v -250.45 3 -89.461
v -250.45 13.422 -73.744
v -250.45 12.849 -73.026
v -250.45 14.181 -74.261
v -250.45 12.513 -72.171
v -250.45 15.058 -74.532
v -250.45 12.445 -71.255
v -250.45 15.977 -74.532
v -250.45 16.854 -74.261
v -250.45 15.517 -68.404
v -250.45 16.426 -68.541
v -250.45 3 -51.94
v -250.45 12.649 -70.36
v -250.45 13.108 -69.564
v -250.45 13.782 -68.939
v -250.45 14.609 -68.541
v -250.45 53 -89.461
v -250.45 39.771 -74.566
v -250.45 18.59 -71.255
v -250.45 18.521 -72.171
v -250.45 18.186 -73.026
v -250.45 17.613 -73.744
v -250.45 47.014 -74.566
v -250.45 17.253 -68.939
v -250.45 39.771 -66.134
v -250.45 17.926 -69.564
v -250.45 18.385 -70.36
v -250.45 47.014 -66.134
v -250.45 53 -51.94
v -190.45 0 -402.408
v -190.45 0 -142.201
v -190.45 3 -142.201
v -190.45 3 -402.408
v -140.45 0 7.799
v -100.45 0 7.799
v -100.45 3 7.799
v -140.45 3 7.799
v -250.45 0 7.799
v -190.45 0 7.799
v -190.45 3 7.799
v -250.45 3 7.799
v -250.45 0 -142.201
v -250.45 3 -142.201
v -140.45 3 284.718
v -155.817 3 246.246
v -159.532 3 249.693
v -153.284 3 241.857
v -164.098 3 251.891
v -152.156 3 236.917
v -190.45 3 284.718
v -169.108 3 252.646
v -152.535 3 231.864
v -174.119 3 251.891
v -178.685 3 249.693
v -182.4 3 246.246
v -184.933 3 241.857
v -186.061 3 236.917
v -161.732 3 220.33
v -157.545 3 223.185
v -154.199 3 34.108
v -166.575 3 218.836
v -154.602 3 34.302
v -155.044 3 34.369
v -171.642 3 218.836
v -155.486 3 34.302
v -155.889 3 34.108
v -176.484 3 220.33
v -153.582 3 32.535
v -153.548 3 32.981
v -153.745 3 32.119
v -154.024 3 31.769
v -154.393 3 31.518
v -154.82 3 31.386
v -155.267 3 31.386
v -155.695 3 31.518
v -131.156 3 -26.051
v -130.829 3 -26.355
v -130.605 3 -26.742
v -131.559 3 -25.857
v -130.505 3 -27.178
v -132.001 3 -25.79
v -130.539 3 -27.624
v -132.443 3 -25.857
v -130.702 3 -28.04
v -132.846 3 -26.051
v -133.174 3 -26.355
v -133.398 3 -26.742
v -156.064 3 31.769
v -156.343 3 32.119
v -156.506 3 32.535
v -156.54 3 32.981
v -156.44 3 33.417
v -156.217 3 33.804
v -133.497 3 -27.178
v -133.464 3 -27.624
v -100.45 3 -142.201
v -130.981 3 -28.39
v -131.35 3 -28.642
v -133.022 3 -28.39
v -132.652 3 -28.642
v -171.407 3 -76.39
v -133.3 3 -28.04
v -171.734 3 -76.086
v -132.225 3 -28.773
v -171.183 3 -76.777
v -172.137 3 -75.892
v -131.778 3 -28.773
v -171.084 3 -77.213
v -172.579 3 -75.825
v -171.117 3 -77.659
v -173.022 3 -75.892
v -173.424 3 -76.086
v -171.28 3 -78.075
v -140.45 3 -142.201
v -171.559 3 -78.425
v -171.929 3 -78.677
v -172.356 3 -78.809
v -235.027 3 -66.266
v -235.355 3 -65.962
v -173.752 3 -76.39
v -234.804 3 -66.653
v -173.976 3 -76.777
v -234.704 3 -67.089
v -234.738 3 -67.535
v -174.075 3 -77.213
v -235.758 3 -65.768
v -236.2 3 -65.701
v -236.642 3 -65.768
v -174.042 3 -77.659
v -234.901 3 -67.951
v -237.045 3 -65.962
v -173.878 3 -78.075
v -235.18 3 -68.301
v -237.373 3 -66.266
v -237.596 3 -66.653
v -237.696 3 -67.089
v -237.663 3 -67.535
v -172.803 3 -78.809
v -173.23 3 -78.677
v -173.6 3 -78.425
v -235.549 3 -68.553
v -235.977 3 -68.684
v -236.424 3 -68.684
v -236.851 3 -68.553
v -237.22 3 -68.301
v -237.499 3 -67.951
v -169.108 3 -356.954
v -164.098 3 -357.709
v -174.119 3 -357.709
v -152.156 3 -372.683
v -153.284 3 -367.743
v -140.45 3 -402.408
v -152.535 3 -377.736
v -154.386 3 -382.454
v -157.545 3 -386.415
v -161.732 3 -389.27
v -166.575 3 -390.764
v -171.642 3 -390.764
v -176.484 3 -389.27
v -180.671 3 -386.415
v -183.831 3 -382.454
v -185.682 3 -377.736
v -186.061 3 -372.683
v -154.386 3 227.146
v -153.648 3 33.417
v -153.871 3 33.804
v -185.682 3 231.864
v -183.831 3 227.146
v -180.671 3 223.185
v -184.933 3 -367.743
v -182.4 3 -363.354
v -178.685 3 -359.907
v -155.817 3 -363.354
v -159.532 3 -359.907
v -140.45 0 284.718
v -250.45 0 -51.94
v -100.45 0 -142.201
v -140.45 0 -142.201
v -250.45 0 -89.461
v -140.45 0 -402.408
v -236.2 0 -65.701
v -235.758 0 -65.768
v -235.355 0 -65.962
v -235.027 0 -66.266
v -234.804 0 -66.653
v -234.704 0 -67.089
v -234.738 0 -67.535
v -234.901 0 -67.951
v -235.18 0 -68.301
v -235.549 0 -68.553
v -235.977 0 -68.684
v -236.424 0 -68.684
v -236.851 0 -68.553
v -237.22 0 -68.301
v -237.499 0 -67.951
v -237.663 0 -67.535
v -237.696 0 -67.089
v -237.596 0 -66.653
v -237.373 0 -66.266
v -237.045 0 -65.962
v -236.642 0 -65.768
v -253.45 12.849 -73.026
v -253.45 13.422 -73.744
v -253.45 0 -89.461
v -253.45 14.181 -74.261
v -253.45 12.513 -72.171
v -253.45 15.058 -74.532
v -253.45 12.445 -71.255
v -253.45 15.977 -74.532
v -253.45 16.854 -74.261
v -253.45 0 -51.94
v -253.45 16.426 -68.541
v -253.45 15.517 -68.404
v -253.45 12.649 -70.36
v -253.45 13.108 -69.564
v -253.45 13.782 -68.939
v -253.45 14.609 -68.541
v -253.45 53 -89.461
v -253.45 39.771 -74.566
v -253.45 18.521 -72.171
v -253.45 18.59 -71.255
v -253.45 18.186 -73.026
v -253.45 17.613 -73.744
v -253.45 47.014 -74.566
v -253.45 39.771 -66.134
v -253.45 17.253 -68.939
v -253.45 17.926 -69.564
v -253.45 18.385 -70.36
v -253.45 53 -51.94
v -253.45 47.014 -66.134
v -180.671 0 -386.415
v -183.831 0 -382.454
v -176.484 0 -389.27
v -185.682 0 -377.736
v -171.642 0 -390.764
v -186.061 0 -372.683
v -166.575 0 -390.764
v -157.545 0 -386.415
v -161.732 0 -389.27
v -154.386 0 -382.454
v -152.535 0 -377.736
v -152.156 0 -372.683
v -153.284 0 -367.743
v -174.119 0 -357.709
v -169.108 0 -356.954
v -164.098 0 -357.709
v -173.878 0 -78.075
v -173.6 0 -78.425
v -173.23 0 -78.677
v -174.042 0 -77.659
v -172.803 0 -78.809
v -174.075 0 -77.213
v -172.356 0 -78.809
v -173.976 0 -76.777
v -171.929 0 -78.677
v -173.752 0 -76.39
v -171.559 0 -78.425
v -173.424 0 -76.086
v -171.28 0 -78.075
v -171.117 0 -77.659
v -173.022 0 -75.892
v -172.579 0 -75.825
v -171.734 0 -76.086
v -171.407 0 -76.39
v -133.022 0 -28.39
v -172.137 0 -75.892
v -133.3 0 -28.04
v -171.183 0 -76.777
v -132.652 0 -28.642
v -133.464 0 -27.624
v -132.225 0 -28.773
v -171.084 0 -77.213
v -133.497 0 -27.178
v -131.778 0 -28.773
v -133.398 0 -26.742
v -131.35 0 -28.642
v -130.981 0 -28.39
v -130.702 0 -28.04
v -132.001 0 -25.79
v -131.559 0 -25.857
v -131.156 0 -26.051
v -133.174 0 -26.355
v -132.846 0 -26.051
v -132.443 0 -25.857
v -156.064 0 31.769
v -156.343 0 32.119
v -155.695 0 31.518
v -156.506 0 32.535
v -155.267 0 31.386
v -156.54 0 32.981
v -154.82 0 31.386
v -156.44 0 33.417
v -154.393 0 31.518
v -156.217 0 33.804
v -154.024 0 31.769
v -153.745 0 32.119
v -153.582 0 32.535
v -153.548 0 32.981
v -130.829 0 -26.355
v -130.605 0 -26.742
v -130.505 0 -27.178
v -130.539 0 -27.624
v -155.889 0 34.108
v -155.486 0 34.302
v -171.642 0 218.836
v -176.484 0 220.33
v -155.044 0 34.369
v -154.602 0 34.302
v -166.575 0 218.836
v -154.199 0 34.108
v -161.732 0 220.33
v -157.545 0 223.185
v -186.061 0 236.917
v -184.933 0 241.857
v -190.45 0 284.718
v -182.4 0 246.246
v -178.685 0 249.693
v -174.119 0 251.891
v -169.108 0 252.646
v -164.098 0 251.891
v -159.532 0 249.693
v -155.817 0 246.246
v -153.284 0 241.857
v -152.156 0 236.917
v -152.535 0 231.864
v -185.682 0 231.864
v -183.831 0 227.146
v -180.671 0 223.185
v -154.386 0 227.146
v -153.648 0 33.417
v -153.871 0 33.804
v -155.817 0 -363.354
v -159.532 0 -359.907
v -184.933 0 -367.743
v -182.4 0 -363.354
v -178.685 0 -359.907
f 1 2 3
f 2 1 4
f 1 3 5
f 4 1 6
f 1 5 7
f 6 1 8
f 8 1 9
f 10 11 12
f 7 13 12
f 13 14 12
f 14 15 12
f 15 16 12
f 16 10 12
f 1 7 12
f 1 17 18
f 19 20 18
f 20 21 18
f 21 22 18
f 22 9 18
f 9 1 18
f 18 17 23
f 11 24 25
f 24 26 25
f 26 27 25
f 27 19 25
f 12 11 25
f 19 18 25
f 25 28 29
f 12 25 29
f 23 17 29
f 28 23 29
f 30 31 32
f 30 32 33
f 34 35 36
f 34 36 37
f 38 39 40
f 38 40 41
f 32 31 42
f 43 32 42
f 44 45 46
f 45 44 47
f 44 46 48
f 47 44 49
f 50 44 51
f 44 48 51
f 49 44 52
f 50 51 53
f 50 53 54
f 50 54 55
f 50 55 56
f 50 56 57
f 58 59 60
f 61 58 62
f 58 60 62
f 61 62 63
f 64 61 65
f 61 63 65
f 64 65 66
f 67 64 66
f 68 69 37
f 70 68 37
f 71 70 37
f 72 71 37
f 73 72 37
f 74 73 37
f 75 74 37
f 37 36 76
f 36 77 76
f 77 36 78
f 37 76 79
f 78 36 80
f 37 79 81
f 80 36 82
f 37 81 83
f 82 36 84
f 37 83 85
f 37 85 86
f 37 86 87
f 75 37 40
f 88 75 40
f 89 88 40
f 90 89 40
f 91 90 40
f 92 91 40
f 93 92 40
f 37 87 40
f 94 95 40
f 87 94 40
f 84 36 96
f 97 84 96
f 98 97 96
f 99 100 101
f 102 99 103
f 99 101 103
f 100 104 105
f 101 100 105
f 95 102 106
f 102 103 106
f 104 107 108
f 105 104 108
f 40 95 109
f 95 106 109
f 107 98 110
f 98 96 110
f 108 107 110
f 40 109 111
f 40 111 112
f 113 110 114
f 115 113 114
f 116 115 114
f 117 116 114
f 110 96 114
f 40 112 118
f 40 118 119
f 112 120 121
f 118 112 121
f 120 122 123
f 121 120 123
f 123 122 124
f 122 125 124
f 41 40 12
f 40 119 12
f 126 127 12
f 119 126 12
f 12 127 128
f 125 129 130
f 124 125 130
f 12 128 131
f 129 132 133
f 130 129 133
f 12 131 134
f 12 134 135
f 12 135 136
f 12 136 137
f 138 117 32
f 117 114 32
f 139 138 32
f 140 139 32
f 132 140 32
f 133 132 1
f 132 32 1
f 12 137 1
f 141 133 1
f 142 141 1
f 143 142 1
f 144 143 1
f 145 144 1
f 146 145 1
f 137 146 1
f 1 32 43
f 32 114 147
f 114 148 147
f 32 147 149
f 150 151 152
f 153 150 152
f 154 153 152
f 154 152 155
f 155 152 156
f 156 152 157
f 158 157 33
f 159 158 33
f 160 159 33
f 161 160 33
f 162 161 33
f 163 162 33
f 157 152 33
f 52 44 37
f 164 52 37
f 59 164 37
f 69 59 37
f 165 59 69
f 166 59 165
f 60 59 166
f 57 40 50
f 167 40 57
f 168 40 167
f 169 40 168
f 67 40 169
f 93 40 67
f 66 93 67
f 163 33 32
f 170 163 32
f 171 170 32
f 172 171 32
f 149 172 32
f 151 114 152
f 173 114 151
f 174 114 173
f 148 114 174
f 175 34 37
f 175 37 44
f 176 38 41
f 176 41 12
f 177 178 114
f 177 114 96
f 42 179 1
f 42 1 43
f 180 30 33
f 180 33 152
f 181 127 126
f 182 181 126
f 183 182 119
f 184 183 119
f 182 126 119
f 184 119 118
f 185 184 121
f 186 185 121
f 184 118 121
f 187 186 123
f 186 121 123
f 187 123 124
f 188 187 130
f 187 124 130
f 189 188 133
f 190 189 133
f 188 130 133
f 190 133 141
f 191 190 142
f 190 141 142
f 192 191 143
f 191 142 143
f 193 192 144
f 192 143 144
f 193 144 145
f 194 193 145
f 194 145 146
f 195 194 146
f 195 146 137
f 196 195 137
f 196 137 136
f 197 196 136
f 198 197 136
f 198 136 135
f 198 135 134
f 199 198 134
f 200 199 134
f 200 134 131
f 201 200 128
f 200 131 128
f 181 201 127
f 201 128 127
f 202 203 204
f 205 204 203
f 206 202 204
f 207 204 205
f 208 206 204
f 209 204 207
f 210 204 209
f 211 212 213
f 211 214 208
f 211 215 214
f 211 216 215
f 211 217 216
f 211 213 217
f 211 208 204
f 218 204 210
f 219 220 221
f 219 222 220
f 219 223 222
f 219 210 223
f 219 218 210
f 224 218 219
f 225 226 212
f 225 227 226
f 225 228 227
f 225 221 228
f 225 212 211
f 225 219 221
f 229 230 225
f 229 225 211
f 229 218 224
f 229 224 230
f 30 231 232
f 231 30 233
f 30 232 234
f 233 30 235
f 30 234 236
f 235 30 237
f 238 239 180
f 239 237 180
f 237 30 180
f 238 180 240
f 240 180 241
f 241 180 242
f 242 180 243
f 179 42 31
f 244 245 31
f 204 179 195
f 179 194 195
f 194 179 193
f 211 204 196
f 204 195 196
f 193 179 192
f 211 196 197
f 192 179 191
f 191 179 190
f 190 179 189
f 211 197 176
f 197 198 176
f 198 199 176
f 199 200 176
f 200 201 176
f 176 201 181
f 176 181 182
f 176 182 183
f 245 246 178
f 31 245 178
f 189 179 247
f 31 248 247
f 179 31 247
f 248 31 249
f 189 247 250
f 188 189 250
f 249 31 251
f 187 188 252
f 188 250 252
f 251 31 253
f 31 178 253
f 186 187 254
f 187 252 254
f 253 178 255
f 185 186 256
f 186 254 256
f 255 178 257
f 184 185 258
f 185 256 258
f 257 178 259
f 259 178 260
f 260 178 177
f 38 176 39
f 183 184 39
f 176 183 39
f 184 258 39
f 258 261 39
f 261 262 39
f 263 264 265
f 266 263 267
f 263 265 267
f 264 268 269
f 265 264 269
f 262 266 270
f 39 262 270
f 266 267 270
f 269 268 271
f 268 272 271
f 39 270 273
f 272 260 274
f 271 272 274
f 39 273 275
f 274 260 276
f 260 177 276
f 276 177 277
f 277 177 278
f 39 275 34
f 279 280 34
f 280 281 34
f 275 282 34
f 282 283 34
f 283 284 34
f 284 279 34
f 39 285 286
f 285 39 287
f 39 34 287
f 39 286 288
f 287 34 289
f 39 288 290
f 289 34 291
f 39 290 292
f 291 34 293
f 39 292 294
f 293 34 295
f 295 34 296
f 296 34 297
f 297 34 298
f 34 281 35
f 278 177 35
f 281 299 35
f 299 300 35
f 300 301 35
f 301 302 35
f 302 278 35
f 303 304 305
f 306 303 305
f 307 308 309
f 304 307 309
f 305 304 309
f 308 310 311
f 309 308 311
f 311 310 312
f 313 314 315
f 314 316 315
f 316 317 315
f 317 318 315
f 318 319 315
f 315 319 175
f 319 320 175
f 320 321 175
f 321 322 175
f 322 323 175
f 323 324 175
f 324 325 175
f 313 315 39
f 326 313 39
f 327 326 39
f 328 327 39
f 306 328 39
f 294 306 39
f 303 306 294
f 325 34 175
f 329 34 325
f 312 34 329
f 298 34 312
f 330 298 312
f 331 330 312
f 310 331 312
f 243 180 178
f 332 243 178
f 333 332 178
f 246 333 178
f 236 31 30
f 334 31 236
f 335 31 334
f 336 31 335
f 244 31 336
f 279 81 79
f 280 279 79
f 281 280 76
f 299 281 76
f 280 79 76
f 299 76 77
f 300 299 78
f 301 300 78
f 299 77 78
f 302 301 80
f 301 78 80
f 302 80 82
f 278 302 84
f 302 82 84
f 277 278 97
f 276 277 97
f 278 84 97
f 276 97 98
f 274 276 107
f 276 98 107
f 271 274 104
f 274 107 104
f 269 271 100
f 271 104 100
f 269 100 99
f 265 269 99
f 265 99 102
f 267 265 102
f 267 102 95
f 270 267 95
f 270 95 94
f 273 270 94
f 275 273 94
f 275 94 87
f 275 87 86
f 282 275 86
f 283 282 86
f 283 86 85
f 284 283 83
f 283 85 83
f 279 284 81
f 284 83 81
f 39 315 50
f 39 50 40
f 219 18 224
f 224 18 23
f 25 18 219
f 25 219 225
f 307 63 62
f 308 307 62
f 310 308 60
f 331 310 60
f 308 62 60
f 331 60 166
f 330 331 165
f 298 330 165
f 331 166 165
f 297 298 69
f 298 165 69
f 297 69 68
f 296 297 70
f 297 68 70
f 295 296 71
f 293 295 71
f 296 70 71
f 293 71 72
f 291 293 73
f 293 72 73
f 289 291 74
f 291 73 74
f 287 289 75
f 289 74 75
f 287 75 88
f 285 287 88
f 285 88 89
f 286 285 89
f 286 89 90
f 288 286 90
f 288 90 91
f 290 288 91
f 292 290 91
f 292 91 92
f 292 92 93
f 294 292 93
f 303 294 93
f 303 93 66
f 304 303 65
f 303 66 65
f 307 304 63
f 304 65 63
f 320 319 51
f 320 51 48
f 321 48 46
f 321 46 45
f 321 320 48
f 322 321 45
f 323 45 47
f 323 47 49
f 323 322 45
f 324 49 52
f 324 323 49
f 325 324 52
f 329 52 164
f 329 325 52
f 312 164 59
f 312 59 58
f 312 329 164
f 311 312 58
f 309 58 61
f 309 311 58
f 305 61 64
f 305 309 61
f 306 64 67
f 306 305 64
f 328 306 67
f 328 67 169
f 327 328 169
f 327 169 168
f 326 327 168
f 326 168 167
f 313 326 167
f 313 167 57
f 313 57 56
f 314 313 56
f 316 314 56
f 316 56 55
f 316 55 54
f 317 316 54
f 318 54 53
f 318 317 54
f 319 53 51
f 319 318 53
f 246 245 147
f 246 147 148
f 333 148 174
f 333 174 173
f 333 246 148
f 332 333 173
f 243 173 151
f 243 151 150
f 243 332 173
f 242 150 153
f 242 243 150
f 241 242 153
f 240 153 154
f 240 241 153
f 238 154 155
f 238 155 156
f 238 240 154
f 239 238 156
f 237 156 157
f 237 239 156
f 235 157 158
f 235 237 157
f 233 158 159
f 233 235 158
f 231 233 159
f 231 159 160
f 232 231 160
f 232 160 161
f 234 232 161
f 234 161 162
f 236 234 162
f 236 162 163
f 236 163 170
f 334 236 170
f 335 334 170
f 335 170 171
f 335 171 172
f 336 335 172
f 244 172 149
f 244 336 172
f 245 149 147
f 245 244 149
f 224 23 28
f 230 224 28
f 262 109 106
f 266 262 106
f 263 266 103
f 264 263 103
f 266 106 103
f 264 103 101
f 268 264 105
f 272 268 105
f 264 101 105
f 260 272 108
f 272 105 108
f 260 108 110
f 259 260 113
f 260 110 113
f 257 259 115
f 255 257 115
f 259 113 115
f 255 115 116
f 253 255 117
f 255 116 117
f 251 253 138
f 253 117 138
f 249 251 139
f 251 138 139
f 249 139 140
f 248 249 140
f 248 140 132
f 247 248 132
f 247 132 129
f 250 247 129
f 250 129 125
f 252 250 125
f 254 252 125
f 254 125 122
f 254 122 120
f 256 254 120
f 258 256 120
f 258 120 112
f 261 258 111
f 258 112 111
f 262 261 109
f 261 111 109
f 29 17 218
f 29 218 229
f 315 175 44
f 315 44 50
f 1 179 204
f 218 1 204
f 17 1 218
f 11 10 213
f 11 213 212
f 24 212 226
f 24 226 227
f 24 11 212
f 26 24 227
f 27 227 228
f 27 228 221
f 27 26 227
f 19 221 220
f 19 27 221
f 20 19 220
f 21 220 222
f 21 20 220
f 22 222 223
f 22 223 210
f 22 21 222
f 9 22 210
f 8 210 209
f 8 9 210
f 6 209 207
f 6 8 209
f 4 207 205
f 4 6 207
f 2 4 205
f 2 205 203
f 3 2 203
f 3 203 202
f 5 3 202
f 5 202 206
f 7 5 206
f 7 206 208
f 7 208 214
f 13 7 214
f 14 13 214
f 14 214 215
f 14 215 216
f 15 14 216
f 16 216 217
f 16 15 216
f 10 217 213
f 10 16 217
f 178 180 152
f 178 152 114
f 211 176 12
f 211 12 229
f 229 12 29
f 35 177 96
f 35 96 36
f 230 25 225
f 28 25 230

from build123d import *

# Parameters (mm, degrees)
SKETCH1_R           = 17
BOSS_EXTRUDE1_DEPTH = 3
SKETCH3_W           = 37.520369423
SKETCH3_H           = 53
SKETCH3_R           = 3.081115769
SKETCH3_W_2         = 8.431940609
SKETCH3_H_2         = 7.24288365
BOSS_EXTRUDE2_DEPTH = 3
SKETCH2_R           = 1.5
CUT_EXTRUDE1_DEPTH  = 3


with BuildPart() as part:
    # Sketch1 → Boss-Extrude1 (new body)
    with BuildSketch(Plane(origin=(0, 0, 0), x_dir=(1, 0, 0), z_dir=(0, 1, 0))):
        Polygon((-140.450145292, 142.201168563), (-100.450145292, 142.201168563), (-100.450145292, -7.798831437), (-140.450145292, -7.798831437), (-140.450145292, -284.717952364), (-190.450145292, -284.717952364), (-190.450145292, -7.798831437), (-250.450145292, -7.798831437), (-250.450145292, 142.201168563), (-200.450145292, 142.201168563), (-190.450145292, 142.201168563), (-190.450145292, 402.408103705), (-140.450145292, 402.408103705), align=None)
        with Locations(Location((-169.10841193, 373.953530137, 0), (0, 0, 270))):
            Circle(SKETCH1_R, mode=Mode.SUBTRACT)
        with Locations(Location((-169.10841193, -235.646469863, 0), (0, 0, 270))):
            Circle(SKETCH1_R, mode=Mode.SUBTRACT)
    extrude(amount=BOSS_EXTRUDE1_DEPTH)

    # Sketch3 → Boss-Extrude2 (add)
    with BuildSketch(Plane.ZY.offset(250.450145292)):
        with Locations((-70.700585856, 26.5)):
            Rectangle(SKETCH3_W, SKETCH3_H)
        with Locations((-71.485173946, 15.517365386)):
            Circle(SKETCH3_R, mode=Mode.SUBTRACT)
        with Locations((-70.350319411, 43.392750381)):
            Rectangle(SKETCH3_W_2, SKETCH3_H_2, mode=Mode.SUBTRACT)
    extrude(amount=BOSS_EXTRUDE2_DEPTH)

    # Sketch2 → Cut-Extrude1 (cut)
    with BuildSketch(Plane(origin=(0, 3, 0), x_dir=(1, 0, 0), z_dir=(0, 1, 0))):
        with Locations(Location((-236.200145292, 67.201168563, 0), (0, 0, 270))):
            Circle(SKETCH2_R)
        with Locations(Location((-172.579411925, 77.325298746, 0), (0, 0, 270))):
            Circle(SKETCH2_R)
        with Locations(Location((-132.001291312, 27.290192535, 0), (0, 0, 270))):
            Circle(SKETCH2_R)
        with Locations(Location((-155.043904065, -32.86904386, 0), (0, 0, 270))):
            Circle(SKETCH2_R)
        with Locations((-218.664637432, -42.993174043)):
            Circle(SKETCH2_R)
        with Locations((-259.242758045, 7.041932168)):
            Circle(SKETCH2_R)
    extrude(amount=-CUT_EXTRUDE1_DEPTH, mode=Mode.SUBTRACT)


solid = part.part
